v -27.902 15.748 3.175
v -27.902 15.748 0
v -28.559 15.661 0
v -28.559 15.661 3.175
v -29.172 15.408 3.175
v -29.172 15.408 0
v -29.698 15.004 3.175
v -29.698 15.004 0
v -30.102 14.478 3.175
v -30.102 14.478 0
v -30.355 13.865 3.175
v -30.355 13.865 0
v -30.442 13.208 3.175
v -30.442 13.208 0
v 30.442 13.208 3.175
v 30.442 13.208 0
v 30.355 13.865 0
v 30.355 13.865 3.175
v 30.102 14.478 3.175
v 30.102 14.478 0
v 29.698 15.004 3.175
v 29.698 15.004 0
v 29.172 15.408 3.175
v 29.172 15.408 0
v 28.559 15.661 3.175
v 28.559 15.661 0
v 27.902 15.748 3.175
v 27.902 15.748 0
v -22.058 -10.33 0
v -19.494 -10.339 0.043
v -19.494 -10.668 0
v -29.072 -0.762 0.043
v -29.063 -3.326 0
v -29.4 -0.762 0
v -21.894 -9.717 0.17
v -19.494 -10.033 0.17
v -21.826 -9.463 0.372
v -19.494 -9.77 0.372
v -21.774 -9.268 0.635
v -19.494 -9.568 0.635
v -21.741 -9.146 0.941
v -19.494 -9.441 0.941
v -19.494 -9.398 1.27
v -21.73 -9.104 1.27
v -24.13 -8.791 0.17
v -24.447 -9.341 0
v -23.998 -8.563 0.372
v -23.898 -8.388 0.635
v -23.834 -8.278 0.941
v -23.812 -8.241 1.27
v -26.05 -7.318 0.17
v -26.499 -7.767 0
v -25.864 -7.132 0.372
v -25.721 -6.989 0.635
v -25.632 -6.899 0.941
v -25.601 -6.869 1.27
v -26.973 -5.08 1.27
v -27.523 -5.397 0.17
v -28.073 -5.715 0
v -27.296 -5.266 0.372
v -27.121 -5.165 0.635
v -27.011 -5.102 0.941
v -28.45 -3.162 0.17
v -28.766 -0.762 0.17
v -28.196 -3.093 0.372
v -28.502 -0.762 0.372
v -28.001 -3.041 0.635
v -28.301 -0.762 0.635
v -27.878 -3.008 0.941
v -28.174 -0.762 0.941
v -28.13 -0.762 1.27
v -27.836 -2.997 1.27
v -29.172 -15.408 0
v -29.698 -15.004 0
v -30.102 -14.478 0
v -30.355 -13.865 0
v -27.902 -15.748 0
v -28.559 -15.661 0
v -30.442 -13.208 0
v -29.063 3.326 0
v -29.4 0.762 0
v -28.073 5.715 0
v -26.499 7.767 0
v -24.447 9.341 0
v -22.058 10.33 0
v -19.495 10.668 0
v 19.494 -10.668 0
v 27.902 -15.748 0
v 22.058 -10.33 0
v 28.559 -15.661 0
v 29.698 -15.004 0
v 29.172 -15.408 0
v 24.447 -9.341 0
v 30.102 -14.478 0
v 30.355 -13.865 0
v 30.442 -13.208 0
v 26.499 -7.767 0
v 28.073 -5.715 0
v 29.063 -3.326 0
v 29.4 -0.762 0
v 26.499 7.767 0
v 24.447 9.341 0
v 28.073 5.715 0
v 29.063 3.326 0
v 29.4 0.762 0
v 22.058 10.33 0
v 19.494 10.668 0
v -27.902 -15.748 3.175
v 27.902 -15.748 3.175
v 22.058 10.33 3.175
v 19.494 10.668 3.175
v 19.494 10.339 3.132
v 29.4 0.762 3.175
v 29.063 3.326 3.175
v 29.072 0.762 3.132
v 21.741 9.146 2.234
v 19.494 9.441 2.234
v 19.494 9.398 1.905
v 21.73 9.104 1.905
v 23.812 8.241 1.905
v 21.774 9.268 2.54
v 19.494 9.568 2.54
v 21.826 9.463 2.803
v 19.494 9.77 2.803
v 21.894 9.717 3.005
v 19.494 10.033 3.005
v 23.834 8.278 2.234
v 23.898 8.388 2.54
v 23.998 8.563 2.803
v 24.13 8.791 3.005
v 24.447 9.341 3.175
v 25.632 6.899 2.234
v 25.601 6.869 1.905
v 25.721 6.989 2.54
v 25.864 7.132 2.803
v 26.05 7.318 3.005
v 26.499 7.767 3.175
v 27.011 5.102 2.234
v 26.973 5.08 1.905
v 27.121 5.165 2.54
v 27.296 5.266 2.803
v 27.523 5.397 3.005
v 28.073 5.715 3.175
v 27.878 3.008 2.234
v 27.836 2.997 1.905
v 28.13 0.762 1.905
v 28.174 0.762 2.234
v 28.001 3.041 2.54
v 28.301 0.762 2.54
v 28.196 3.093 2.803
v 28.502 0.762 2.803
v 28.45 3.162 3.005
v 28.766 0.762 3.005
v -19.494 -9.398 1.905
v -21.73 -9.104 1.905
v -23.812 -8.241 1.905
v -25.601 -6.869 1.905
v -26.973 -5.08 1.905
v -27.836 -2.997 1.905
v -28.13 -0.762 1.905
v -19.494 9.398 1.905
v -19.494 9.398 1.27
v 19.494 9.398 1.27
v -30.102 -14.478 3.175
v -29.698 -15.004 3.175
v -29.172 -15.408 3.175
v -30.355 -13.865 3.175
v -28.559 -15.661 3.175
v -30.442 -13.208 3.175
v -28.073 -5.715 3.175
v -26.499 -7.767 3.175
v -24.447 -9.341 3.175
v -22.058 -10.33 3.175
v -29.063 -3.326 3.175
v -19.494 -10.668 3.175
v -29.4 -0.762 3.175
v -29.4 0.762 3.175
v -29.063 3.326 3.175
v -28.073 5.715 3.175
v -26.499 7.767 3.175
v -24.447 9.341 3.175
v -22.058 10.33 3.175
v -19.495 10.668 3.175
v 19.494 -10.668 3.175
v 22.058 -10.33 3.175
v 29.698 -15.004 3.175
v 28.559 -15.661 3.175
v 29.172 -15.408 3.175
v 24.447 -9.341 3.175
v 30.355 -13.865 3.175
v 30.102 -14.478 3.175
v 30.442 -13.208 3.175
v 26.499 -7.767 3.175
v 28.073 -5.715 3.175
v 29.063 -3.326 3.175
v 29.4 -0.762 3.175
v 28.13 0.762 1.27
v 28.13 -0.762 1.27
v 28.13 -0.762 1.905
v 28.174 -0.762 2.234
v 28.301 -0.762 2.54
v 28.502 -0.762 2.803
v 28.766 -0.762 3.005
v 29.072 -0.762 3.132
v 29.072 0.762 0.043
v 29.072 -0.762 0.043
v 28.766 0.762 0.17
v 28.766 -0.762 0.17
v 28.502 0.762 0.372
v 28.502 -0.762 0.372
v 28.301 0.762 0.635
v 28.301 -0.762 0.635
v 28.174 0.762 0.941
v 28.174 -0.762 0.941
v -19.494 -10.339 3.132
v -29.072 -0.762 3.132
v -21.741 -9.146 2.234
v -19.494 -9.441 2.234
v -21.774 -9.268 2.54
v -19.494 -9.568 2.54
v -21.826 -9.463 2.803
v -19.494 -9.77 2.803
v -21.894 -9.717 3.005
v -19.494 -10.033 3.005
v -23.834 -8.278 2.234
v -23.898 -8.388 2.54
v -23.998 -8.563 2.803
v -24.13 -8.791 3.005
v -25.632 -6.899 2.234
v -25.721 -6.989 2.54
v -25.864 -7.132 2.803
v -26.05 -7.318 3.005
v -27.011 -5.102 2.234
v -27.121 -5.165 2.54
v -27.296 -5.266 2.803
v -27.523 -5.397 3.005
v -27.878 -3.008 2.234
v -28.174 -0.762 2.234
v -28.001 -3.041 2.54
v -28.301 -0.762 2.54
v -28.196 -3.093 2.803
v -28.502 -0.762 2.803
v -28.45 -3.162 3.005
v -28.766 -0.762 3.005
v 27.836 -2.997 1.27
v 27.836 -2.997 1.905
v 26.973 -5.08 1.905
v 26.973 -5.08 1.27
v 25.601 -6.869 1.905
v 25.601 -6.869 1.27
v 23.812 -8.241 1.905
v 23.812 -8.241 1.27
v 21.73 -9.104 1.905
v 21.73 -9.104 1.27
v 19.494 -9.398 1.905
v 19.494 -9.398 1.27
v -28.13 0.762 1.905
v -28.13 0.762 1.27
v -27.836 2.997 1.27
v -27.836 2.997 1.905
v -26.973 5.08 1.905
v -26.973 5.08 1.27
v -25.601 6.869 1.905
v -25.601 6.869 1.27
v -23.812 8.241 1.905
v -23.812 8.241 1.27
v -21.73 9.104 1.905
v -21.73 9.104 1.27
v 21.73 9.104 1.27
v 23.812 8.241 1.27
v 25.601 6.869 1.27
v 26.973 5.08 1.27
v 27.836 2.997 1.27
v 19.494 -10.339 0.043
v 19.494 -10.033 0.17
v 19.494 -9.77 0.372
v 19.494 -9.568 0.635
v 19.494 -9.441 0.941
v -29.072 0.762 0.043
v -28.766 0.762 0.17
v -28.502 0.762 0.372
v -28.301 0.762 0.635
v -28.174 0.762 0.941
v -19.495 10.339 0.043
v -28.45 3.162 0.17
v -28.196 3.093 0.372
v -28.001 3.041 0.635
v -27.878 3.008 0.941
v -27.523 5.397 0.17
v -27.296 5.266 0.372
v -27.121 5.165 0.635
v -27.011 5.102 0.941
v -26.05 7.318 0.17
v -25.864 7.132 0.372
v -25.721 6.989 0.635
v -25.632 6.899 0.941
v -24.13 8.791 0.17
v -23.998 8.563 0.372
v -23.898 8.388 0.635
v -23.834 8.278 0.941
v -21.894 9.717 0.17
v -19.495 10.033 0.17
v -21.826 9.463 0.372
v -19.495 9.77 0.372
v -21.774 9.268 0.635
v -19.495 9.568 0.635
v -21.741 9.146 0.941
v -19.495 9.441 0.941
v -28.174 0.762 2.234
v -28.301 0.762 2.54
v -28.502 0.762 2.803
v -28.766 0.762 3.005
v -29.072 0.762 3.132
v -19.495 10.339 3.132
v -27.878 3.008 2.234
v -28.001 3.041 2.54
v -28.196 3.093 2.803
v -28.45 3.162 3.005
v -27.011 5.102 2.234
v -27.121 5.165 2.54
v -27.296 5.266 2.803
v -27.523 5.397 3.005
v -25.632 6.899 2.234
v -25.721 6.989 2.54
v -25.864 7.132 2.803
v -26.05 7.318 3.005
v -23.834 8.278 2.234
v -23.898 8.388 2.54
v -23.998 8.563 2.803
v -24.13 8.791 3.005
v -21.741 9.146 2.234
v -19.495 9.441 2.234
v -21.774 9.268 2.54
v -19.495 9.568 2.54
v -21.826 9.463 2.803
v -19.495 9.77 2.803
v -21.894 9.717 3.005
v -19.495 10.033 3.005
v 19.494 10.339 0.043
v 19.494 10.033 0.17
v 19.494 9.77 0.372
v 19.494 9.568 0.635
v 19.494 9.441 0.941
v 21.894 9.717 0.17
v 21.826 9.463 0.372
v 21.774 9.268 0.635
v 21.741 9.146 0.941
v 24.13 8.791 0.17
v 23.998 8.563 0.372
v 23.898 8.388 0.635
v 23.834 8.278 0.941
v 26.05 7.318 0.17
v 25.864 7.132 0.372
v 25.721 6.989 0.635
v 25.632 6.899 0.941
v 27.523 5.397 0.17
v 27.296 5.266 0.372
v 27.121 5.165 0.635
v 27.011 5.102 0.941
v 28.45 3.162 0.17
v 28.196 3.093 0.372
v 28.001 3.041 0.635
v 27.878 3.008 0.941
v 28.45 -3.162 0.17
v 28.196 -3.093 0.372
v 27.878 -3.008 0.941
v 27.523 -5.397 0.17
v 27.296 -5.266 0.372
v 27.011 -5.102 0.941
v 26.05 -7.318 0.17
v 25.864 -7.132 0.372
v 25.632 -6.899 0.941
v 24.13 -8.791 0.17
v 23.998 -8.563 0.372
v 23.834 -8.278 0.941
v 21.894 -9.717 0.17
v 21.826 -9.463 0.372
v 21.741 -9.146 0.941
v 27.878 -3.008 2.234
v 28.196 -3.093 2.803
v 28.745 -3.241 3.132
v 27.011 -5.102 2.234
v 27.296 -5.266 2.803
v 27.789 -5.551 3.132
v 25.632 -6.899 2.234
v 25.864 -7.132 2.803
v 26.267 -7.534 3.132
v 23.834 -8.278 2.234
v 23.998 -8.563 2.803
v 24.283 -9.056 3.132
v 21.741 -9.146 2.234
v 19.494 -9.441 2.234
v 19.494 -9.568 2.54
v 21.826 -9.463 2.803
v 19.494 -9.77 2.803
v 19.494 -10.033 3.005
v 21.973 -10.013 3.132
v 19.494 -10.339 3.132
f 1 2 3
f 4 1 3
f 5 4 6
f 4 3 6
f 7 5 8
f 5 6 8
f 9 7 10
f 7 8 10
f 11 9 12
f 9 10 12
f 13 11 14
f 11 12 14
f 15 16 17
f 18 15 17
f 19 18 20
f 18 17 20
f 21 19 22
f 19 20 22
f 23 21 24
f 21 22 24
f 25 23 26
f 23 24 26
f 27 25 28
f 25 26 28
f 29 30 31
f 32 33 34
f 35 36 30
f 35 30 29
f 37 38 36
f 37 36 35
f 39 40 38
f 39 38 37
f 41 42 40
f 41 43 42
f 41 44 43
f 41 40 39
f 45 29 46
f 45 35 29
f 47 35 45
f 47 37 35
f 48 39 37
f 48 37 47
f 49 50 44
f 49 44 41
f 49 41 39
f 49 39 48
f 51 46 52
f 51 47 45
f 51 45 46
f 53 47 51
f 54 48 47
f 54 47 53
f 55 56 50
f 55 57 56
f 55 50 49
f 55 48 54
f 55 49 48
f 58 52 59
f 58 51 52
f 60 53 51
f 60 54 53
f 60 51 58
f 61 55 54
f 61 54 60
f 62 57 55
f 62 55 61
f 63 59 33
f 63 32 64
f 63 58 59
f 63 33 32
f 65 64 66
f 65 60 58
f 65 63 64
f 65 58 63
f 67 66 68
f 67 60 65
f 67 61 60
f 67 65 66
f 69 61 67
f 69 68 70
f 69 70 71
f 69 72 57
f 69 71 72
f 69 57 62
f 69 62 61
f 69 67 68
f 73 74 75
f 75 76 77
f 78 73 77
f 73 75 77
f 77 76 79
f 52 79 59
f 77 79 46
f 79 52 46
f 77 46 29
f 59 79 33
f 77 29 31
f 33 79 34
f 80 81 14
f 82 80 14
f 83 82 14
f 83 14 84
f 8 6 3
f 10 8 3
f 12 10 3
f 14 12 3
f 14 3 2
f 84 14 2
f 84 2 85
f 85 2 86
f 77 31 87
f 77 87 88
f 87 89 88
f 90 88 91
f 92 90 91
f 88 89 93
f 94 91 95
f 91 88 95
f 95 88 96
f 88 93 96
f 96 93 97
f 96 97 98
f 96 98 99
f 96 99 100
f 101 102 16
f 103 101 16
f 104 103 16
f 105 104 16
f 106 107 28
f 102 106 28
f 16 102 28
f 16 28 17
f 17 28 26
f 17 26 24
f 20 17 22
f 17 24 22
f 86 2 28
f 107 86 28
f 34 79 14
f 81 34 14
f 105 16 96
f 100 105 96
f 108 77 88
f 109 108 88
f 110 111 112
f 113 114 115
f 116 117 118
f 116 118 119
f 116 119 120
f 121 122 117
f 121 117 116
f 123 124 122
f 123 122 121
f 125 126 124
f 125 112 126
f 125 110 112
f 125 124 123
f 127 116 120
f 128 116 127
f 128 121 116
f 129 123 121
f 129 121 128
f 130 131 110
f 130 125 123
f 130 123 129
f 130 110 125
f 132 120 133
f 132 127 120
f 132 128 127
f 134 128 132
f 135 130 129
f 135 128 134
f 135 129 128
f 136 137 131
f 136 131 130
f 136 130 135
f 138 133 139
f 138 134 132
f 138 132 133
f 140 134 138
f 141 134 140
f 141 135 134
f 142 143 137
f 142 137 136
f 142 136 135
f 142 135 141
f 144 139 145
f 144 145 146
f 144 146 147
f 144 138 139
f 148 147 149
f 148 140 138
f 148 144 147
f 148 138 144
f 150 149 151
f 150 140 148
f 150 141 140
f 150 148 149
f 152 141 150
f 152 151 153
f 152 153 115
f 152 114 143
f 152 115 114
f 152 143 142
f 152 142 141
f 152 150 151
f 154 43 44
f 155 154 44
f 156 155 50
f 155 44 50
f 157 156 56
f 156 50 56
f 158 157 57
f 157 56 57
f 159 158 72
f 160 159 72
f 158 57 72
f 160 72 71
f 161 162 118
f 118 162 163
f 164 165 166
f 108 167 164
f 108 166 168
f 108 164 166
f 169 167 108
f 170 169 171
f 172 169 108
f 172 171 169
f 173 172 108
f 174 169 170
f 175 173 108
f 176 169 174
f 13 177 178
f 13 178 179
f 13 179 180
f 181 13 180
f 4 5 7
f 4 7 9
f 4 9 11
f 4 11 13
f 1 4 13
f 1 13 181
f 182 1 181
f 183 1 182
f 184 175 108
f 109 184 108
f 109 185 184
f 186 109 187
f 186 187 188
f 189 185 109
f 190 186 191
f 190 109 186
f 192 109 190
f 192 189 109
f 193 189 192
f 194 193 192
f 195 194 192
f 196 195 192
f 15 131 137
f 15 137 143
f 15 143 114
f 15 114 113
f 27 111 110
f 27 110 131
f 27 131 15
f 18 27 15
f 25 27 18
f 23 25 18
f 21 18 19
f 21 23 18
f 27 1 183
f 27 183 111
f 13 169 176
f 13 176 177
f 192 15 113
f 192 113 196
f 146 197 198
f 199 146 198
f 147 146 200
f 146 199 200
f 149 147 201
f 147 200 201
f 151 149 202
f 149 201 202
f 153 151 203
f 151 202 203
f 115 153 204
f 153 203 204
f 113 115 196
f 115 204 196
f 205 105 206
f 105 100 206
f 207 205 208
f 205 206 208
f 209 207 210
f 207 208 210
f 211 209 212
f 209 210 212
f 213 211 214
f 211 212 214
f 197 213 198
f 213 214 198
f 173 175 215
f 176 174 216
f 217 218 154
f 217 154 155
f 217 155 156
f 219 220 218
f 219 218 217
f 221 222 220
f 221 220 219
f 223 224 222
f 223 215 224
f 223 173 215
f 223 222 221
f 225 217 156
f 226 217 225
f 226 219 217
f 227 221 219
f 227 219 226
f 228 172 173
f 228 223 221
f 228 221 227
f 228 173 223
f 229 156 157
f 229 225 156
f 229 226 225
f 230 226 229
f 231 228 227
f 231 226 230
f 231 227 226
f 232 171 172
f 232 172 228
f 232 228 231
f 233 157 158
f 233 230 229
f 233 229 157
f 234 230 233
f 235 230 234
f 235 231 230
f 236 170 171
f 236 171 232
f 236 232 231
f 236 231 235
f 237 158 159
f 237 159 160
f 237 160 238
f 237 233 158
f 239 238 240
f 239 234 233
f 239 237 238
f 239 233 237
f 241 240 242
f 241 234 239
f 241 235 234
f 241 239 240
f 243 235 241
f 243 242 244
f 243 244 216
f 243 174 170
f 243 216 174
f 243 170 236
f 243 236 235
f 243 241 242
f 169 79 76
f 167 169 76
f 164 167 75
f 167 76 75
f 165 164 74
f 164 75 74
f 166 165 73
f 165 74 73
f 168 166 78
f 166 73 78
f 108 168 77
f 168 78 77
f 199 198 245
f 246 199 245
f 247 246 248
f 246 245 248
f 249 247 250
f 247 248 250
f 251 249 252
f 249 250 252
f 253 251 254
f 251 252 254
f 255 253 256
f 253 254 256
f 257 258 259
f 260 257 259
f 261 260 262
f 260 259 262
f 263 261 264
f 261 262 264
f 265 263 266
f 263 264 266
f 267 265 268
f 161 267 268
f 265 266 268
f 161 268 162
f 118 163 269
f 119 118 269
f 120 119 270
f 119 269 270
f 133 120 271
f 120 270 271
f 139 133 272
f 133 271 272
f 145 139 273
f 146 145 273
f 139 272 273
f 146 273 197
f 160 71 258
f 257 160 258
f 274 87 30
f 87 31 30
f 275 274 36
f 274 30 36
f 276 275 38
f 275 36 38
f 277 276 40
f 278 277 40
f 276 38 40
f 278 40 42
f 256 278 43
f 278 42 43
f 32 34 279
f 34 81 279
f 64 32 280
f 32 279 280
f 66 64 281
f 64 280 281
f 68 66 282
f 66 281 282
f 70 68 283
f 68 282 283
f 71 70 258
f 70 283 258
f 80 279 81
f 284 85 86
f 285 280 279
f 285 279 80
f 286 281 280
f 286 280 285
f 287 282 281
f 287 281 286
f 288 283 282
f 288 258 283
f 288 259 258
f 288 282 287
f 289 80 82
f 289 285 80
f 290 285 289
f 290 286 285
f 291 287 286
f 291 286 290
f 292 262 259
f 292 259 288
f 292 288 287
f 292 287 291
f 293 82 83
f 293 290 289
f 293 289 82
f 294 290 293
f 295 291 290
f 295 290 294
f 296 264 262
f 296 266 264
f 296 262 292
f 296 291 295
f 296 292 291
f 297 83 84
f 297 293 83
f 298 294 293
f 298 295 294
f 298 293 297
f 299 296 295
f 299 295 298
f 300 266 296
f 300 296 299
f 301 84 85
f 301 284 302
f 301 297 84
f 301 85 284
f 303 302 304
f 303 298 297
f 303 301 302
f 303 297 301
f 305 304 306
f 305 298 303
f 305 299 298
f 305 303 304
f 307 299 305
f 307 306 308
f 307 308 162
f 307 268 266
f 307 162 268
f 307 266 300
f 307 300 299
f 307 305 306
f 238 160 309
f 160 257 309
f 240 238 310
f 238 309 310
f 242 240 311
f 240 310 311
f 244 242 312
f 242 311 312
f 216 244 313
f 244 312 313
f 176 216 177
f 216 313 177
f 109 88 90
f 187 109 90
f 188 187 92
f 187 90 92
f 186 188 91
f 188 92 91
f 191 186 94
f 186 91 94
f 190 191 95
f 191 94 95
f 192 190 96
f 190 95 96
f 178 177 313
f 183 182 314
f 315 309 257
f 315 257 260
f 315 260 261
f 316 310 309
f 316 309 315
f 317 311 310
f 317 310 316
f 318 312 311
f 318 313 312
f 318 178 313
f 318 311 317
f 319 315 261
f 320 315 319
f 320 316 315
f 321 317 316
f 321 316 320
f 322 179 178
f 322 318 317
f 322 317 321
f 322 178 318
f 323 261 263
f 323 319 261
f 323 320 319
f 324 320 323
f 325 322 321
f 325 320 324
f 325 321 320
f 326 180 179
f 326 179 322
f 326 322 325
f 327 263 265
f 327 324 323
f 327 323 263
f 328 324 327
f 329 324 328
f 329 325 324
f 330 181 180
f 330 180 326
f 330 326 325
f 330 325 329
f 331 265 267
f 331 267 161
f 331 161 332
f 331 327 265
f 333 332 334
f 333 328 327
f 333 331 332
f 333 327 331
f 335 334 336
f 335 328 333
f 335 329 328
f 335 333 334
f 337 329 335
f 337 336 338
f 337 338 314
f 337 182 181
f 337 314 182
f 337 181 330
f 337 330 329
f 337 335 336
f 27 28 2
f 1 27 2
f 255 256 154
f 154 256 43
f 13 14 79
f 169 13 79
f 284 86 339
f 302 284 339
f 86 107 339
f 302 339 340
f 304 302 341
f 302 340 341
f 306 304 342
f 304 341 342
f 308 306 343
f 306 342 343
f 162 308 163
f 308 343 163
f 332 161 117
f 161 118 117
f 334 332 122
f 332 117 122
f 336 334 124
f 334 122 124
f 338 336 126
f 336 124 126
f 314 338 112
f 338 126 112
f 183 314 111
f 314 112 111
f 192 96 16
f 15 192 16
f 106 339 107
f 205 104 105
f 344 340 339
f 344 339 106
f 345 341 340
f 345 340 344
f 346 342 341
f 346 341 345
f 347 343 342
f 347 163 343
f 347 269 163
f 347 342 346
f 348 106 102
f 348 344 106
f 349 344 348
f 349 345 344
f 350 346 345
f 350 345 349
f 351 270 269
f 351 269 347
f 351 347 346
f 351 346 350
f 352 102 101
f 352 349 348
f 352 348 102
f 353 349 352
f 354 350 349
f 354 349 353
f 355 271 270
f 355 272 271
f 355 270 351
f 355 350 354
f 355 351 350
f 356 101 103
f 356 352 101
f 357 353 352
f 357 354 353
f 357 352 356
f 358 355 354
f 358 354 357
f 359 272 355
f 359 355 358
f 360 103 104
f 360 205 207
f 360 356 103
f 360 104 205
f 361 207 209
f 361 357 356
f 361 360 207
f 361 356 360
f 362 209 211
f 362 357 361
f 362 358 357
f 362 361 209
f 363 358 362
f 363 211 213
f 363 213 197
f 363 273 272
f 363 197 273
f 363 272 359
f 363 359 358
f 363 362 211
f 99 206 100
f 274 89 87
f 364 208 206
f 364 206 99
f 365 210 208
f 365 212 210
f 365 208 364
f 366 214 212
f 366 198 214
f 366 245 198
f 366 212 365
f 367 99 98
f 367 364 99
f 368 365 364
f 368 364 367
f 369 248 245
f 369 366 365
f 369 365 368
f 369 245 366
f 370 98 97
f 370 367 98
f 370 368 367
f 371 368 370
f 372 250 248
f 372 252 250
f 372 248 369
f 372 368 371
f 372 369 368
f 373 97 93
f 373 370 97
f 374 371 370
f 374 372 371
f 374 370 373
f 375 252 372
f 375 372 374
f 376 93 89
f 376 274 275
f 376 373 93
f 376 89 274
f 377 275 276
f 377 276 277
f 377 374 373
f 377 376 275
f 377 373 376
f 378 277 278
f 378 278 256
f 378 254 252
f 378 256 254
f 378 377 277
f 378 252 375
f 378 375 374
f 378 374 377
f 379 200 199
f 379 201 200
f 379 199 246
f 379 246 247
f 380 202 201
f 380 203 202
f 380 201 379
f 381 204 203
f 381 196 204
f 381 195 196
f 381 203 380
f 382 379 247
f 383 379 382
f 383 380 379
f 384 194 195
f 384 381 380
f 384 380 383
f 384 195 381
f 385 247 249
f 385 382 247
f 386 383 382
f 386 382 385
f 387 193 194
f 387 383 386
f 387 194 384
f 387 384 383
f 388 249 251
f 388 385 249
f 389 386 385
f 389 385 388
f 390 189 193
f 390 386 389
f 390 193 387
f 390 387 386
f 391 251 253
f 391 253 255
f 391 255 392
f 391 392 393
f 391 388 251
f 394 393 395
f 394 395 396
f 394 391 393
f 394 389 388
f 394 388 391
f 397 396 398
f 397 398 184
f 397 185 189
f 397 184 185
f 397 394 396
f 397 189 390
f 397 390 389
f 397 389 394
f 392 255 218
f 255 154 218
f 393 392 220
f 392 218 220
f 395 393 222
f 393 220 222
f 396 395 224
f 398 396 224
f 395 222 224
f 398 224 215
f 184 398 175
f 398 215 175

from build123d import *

# Parameters (mm, degrees)
F1_DEPTH = 3.175
F2_R     = 1.27
F3_R     = 1.27


with BuildPart() as f1:
    # F0 (on Top) → F1 (new body)
    with BuildSketch(Plane.XY):
        with BuildLine():
            ThreePointArc((30.4419, 13.208), (29.697951, 15.004051), (27.9019, 15.748))
            Line((27.9019, 15.748), (-27.9019, 15.748))
            ThreePointArc((-27.9019, 15.748), (-29.697951, 15.004051), (-30.4419, 13.208))
            Line((-30.4419, 13.208), (-30.4419, -13.208))
            ThreePointArc((-30.4419, -13.208), (-29.697951, -15.004051), (-27.9019, -15.748))
            Line((-27.9019, -15.748), (27.9019, -15.748))
            ThreePointArc((27.9019, -15.748), (29.697951, -15.004051), (30.4419, -13.208))
            Line((30.4419, -13.208), (30.4419, 13.208))
        make_face()
        with BuildLine():
            ThreePointArc((28.1305, -0.762), (25.601074, -6.868574), (19.4945, -9.398))
            Line((19.4945, -9.398), (-19.4945, -9.398))
            ThreePointArc((-19.4945, -9.398), (-25.601074, -6.868574), (-28.1305, -0.762))
            Line((-28.1305, -0.762), (-28.1305, 0.762))
            ThreePointArc((-28.1305, 0.762), (-25.601074, 6.868574), (-19.4945, 9.398))
            Line((-19.4945, 9.398), (19.4945, 9.398))
            ThreePointArc((19.4945, 9.398), (25.601074, 6.868574), (28.1305, 0.762))
            Line((28.1305, 0.762), (28.1305, -0.762))
        make_face(mode=Mode.SUBTRACT)
    extrude(amount=F1_DEPTH)

    # F2
    f2_edges = [f1.edges().sort_by_distance(p)[0] for p in [
        (0, -9.398, 3.175),
    ]]
    fillet(f2_edges, radius=F2_R)

    # F3
    f3_edges = [f1.edges().sort_by_distance(p)[0] for p in [
        (0, -9.398, 0),
        (25.601074, -6.868574, 0),
        (-25.601074, -6.868574, 0),
        (-25.601074, 6.868574, 0),
        (0, 9.398, 0),
        (25.601074, 6.868574, 0),
        (28.1305, 0, 0),
        (-28.1305, 0, 0),
    ]]
    fillet(f3_edges, radius=F3_R)


solid = f1.part
